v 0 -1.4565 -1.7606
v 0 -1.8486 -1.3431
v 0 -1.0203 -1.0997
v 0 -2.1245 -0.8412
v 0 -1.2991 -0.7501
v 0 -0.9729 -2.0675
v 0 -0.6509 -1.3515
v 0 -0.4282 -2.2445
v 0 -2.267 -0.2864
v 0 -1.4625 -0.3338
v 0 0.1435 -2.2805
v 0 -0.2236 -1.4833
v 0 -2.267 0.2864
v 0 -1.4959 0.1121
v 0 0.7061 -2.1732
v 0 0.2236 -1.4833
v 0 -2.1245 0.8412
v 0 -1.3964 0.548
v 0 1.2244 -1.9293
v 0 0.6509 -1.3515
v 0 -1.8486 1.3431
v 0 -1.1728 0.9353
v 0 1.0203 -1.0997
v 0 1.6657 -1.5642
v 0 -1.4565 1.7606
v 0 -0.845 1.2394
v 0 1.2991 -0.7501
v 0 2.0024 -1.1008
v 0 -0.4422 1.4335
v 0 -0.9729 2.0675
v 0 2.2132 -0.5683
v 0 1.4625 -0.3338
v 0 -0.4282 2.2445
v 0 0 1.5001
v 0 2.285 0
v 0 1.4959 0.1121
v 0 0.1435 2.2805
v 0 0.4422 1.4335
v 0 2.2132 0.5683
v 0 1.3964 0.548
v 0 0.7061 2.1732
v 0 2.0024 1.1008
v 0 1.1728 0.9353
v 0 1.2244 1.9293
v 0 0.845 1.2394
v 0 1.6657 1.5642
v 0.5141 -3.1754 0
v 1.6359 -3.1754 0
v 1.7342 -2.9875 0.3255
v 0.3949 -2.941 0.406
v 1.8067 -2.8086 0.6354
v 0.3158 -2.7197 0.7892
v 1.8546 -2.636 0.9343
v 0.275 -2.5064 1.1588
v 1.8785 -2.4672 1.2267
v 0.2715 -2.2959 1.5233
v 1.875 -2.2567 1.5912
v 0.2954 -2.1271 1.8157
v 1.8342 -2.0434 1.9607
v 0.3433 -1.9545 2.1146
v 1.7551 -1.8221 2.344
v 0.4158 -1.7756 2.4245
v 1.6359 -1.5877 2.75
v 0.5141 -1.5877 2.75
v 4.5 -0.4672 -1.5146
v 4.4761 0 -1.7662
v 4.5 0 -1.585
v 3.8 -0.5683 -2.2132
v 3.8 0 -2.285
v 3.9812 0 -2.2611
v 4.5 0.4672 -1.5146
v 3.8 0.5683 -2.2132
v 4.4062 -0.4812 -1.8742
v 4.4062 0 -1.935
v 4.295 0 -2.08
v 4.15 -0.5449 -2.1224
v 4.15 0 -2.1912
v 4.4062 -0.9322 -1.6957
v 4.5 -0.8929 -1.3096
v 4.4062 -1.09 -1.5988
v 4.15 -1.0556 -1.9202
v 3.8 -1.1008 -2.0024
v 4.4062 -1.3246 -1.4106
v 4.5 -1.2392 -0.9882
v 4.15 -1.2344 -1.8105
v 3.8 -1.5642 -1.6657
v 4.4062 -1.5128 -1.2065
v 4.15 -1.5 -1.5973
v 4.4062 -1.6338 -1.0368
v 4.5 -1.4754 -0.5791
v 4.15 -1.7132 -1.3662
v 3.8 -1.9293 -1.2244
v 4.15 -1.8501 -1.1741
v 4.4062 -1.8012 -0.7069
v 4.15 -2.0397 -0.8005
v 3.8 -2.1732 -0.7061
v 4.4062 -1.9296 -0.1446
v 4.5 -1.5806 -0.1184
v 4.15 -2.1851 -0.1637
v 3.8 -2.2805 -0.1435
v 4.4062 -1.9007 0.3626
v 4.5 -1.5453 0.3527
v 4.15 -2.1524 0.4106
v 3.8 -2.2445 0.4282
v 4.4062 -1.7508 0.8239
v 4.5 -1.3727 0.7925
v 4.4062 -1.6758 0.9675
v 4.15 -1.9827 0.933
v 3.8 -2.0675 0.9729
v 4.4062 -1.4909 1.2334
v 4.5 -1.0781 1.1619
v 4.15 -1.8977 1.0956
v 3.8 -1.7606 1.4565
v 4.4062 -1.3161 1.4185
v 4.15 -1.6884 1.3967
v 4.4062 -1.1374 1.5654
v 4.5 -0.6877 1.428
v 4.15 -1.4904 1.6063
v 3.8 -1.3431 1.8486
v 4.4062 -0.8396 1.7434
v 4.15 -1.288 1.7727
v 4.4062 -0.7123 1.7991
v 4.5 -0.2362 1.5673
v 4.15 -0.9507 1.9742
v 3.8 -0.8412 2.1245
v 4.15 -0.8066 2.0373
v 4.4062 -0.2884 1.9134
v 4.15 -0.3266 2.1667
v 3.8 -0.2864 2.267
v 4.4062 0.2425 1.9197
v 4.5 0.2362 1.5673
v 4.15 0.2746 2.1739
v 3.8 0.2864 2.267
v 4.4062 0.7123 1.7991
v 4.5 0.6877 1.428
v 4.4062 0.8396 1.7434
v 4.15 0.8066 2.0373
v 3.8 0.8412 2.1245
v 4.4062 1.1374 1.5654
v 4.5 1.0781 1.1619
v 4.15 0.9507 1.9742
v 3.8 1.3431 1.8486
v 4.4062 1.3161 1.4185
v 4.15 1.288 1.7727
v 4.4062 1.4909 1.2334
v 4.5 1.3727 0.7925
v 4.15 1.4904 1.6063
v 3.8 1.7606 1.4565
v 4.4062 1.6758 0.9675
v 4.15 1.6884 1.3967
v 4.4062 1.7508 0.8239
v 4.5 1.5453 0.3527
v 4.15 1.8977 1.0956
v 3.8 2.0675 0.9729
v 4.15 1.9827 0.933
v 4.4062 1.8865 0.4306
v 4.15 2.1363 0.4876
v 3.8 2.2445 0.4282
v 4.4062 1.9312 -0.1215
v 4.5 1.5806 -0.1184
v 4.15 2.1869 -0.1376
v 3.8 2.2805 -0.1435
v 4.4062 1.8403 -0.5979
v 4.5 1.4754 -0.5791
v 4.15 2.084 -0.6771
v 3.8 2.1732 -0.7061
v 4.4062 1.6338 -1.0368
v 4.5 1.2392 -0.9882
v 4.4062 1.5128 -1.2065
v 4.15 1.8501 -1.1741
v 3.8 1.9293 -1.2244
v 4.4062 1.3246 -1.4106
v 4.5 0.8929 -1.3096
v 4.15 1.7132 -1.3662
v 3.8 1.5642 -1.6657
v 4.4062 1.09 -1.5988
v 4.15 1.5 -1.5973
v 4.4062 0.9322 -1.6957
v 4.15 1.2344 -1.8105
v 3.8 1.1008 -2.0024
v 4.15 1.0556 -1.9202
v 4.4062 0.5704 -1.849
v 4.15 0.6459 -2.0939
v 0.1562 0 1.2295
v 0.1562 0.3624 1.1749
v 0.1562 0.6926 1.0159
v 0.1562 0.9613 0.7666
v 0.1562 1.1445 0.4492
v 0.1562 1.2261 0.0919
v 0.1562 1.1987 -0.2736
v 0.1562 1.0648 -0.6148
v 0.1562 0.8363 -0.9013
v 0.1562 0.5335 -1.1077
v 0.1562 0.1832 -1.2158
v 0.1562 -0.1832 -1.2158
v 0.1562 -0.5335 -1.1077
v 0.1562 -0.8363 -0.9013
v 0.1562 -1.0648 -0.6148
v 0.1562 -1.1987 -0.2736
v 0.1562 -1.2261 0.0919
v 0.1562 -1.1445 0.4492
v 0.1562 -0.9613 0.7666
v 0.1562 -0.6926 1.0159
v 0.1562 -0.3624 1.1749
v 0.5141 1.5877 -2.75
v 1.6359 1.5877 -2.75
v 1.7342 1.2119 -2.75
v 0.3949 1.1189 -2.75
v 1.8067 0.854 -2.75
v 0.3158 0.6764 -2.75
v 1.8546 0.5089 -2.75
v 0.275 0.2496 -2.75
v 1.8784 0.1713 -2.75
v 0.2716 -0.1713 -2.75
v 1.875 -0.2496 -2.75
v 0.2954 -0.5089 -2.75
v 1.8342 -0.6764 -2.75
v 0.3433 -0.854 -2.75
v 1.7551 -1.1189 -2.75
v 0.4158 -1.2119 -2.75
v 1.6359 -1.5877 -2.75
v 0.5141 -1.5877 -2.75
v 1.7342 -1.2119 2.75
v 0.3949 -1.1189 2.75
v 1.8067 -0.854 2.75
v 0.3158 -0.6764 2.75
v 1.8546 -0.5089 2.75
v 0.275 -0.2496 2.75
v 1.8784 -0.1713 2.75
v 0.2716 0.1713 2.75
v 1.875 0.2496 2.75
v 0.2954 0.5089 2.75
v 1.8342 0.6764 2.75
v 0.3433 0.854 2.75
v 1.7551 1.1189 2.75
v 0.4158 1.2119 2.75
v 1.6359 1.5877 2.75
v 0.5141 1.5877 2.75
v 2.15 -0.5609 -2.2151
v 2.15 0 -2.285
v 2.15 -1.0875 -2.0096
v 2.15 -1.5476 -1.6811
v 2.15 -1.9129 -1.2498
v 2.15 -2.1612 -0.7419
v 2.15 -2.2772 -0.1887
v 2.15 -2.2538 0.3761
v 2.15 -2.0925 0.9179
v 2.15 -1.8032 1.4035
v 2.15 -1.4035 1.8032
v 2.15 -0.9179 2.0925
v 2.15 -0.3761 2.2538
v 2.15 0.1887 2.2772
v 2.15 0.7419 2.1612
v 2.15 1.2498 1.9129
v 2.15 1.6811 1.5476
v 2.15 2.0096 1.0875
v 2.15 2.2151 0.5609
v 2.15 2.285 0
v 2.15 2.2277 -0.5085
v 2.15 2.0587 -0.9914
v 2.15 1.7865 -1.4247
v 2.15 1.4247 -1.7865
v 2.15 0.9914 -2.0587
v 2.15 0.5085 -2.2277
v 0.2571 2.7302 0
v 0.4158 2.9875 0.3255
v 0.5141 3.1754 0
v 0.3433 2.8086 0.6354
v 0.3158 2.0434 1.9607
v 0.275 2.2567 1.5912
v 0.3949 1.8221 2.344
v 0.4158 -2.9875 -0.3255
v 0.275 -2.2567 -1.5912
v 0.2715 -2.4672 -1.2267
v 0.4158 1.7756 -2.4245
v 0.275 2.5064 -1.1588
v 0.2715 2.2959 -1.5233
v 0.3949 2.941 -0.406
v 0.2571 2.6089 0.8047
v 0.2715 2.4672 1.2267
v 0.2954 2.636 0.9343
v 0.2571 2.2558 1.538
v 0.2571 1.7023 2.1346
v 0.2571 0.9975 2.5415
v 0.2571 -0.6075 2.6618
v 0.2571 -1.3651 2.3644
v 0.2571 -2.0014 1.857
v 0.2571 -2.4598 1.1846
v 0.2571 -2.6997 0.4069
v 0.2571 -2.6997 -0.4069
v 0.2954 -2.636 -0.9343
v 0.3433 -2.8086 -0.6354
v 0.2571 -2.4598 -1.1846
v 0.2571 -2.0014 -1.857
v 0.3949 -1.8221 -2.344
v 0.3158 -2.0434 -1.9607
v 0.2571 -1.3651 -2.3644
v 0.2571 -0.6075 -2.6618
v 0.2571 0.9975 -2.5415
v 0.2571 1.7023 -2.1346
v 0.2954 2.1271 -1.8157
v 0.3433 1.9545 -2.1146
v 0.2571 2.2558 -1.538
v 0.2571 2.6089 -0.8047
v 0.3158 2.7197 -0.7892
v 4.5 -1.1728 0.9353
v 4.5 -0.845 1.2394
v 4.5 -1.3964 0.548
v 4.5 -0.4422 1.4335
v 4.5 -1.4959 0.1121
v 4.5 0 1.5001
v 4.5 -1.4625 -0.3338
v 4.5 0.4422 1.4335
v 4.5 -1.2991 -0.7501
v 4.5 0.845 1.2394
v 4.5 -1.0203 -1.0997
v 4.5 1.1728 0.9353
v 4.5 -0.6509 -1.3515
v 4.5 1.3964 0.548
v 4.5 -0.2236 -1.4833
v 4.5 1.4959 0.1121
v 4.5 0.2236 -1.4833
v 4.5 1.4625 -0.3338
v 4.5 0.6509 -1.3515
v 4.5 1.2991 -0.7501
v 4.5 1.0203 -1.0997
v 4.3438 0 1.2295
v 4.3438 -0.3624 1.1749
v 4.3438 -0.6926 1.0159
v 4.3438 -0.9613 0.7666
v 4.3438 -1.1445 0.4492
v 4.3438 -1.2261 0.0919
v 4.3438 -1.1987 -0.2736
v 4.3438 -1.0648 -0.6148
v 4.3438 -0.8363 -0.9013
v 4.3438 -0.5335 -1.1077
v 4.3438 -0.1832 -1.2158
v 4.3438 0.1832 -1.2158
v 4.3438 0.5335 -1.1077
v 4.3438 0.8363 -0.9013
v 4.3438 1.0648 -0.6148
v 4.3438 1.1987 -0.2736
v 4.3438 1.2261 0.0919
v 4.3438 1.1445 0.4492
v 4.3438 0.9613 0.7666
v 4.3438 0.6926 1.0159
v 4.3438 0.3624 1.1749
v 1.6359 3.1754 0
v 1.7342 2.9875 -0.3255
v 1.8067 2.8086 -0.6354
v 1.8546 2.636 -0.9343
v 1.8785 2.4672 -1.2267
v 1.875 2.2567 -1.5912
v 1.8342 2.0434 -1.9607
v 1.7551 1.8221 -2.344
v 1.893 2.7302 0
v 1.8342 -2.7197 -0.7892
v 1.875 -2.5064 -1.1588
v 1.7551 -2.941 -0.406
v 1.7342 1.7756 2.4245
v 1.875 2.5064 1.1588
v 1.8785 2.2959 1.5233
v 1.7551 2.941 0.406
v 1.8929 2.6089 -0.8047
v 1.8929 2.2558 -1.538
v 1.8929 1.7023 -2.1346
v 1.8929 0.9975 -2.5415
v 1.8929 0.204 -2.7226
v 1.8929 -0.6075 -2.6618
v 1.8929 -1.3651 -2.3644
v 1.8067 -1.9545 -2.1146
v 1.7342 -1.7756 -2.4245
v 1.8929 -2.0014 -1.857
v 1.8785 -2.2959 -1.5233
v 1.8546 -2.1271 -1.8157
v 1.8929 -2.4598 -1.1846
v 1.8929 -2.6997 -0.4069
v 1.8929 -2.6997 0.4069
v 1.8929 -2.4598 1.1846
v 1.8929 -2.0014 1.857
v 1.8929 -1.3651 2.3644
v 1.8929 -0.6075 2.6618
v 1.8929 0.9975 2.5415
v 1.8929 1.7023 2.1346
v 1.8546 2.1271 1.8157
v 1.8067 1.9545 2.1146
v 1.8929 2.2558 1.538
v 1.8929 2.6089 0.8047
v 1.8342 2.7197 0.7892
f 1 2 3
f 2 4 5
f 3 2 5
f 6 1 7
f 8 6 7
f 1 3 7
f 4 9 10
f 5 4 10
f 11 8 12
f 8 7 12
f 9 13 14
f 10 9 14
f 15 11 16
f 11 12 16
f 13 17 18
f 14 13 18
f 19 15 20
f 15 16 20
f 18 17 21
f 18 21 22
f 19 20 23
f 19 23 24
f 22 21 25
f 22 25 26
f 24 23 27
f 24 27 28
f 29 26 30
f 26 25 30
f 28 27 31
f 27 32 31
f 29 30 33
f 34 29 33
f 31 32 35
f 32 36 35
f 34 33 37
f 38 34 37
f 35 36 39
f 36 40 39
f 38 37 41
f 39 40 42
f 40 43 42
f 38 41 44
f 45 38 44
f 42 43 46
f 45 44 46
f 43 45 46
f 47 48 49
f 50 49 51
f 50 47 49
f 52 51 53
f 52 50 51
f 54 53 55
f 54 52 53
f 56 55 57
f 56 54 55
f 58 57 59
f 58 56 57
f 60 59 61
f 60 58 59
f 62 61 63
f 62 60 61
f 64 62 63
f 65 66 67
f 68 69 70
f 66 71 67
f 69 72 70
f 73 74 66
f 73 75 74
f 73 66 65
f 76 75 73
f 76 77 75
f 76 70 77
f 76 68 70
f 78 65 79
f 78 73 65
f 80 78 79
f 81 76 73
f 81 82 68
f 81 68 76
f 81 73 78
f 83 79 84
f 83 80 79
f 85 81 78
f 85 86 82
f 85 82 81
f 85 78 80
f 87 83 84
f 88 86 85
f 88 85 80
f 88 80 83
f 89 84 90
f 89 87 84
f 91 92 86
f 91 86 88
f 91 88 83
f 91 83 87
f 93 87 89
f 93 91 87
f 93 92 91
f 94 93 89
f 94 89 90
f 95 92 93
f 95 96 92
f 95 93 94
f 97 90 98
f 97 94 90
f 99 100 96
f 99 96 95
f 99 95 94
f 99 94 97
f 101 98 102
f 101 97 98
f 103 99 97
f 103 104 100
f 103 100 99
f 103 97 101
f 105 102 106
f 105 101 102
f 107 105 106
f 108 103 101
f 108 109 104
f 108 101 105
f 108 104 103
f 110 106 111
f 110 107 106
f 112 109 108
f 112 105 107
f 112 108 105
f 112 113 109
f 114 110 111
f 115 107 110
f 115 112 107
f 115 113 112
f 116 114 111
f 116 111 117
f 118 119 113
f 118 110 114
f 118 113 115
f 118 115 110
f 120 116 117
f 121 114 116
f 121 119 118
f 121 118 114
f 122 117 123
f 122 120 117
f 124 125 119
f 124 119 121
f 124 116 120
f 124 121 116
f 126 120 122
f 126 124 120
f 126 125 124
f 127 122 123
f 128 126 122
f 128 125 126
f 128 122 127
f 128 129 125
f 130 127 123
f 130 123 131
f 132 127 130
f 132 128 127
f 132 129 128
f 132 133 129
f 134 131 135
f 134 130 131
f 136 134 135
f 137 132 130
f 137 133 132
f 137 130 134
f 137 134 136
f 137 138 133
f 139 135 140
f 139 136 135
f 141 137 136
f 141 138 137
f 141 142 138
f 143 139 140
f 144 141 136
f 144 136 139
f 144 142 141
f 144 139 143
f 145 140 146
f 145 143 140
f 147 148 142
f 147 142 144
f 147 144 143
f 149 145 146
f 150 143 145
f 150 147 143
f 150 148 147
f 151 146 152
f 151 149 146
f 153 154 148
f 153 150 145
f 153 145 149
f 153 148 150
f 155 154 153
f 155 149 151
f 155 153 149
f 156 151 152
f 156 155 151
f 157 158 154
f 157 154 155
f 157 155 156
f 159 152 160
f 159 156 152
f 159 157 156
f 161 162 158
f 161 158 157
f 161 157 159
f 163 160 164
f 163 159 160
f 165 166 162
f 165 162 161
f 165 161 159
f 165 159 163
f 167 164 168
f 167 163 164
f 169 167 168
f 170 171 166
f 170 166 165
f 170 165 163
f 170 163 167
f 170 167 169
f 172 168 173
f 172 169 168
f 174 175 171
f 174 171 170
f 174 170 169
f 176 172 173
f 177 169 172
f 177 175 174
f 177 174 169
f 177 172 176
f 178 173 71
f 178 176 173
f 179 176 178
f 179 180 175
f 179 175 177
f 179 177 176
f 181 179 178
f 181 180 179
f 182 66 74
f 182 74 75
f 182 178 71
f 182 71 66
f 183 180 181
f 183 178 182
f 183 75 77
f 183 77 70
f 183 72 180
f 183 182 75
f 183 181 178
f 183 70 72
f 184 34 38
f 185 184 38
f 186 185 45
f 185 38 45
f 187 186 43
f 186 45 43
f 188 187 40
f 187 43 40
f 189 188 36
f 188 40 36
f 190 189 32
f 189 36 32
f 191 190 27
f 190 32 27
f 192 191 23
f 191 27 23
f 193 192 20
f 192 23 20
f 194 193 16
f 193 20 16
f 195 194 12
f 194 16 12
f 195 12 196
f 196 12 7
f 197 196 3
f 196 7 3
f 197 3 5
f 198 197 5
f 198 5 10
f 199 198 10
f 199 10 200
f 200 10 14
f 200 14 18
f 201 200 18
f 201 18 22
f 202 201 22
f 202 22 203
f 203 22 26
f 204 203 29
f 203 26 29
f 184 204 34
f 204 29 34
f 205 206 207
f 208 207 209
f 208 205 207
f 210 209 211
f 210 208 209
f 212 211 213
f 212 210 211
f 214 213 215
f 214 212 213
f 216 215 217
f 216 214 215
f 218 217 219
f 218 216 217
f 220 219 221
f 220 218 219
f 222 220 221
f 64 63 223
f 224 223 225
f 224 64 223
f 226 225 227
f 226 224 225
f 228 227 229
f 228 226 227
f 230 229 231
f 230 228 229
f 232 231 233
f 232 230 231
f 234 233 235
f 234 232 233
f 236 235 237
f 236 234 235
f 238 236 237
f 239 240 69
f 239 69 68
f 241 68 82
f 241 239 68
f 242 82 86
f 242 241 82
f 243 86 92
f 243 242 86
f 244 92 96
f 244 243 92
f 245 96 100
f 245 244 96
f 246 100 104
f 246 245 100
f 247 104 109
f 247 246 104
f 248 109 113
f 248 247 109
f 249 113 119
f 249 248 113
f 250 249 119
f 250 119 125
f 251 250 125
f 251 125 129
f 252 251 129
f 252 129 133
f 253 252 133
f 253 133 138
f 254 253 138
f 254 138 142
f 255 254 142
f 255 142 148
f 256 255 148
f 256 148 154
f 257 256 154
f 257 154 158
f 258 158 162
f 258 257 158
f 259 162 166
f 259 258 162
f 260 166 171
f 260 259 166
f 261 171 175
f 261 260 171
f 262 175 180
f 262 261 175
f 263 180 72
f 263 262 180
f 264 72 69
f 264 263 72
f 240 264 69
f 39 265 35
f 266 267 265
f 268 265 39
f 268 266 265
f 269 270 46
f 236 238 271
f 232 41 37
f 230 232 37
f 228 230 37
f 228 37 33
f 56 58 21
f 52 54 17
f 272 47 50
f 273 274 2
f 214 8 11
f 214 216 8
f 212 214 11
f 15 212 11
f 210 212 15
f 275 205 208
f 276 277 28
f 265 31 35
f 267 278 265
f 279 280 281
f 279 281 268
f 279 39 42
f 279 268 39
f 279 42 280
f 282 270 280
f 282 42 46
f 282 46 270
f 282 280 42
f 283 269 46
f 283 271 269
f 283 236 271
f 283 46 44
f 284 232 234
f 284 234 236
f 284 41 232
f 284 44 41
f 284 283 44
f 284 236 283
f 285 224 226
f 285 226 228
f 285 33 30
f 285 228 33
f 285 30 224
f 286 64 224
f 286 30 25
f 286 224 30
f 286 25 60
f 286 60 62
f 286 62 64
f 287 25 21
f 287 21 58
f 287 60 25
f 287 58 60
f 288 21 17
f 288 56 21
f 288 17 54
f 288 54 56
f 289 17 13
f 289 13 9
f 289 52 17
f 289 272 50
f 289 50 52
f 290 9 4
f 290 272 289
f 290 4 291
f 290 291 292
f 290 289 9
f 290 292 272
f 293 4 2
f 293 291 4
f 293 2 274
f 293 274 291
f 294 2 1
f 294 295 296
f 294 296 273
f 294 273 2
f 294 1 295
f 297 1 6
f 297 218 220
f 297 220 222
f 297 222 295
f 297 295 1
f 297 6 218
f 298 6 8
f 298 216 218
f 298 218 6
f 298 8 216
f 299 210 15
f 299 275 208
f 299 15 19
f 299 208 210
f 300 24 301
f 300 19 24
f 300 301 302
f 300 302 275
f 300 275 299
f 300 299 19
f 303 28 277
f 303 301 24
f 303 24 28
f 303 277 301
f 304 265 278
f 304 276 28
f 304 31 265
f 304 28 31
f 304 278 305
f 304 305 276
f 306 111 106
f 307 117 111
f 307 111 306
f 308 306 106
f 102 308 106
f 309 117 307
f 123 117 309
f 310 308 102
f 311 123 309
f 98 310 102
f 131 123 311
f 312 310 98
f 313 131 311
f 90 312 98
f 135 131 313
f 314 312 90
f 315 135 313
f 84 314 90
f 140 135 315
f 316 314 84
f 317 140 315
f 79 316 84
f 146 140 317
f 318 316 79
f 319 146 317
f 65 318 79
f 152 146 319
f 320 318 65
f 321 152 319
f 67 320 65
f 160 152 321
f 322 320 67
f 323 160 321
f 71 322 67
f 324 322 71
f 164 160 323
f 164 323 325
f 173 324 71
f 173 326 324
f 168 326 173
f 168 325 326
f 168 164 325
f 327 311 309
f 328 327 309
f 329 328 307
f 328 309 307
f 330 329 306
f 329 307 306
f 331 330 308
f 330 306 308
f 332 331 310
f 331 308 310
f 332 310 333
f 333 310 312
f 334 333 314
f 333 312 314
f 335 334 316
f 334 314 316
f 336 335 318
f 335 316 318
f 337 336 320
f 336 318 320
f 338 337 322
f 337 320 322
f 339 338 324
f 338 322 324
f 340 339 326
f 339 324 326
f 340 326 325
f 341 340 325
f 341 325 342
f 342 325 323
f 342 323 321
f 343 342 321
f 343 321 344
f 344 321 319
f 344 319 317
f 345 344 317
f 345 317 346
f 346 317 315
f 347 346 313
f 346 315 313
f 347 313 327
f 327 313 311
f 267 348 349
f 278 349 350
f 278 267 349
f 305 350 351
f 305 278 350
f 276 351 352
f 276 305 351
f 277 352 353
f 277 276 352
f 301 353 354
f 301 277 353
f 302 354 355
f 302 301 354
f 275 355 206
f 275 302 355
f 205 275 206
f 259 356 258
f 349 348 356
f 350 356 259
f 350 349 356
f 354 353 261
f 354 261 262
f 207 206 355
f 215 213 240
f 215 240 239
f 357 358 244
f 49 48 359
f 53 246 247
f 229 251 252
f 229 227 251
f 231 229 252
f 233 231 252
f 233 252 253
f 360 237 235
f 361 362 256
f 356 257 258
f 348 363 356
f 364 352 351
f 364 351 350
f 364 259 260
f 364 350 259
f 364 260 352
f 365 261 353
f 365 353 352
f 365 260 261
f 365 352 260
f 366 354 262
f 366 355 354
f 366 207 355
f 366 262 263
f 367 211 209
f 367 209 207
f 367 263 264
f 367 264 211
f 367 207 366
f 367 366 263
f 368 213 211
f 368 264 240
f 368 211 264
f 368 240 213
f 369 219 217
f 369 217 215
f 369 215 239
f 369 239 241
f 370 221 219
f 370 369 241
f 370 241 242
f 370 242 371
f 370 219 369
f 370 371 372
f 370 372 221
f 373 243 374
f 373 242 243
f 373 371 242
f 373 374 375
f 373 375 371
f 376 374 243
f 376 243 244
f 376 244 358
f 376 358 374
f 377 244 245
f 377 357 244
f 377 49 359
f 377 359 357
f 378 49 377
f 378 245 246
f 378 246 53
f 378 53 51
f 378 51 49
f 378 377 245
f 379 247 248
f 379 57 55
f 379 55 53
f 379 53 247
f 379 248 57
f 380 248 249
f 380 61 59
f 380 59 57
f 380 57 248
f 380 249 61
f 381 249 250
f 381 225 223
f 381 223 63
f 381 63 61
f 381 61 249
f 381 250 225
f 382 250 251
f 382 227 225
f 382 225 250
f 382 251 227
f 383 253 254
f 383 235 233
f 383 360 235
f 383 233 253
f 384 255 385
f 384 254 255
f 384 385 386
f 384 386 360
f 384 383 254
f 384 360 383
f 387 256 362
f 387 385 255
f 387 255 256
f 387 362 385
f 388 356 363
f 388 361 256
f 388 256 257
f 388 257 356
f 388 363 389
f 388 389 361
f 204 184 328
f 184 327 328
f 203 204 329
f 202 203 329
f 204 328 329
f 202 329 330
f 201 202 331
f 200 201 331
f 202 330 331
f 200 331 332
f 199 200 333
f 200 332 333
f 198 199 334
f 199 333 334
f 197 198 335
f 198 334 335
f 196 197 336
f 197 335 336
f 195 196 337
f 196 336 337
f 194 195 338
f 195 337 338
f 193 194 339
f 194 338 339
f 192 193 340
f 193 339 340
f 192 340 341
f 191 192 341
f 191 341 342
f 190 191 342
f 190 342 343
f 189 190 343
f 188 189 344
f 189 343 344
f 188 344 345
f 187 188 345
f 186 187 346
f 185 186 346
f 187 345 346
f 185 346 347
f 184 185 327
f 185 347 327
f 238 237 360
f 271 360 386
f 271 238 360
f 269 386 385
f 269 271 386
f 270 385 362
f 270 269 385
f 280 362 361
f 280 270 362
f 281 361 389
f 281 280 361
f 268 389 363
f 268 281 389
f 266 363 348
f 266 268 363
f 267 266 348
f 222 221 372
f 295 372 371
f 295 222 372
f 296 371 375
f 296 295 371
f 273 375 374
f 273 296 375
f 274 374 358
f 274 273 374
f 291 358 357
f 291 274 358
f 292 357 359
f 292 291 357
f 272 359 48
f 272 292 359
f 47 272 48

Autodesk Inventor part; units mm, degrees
ref_plane "YZ Plane" through (0, 0, 0) normal (1, 0, 0) x (0, 1, 0)
ref_plane "XZ Plane" through (0, 0, 0) normal (0, 1, 0) x (-1, 0, 0)
sketch "Sketch1" plane through (0, 0, 0) normal (1, 0, 0) x (0, 1, 0)
  line L0 (1.5877, -2.75) -> (-1.5877, -2.75)
  line L1 (-1.5877, -2.75) -> (-3.1754, 0)
  line L2 (-3.1754, 0) -> (-1.5877, 2.75)
  line L3 (-1.5877, 2.75) -> (1.5877, 2.75)
  line L4 (1.5877, 2.75) -> (3.1754, 0)
  line L5 (3.1754, 0) -> (1.5877, -2.75)
  point P0 (0, 0)
  point P1 (0, 0)
  dimension "d0" = 6.3509
extrude "Body" add sketch "Sketch1" along normal blind 2.15
sketch "Sketch2" plane through (2.15, 0, 0) normal (1, 0, 0) x (0, 0, -1)
  circle A0 centre (0, 0) radius 2.285
  dimension "d7" = 4.57
extrude "Ring" add sketch "Sketch2" along normal blind 2.35
sketch "Sketch3" plane through (0, 0, 0) normal (0, 0, 1) x (1, 0, 0)
  line L0 (0, 1.5877) -> (0, 3.1754) projected
  line L1 (0, 3.1754) -> (2.15, 3.1754) projected
  line L2 (2.15, 1.5877) -> (2.15, 3.1754) projected
  line L3 (-0.43, 0) -> (2.58, 0) projected
  line L4 (0, 2.285) -> (0.5141, 3.1754)
  line L5 (1.6359, 3.1754) -> (2.15, 2.285)
  dimension "d3" = 30
  dimension "d4" = 30
  dimension "d5" = 4.57
  dimension "d6" = 4.57
revolve "Chamfer1" cut sketch "Sketch3" angle 360 about axis through (-10, 0, 0) along (1, 0, 0)
sketch "Sketch4" plane through (0, 0, 0) normal (-1, 0, 0) x (0, 0, 1)
  line L0 (0, -4.4456) -> (0, 4.4456) projected
  line L1 (-3.85, 0) -> (3.85, 0) projected
  point P0 (0, 0)
hole "Thread" at (0, 0, 0) direction (1, 0, 0) diameter 2.459 end through all thread size "M3x0.5" designation "M3" class "6H" standard "ISO Metric profile"
chamfer "Chamfer2" distance 0.2706 angle 30 1 edges at (0, 0, -1.2295) measured on face at (0, 1.908, -0.2317)
chamfer "Chamfer3" distance 0.2706 angle 30 1 edges at (4.5, 0, -1.2295) measured on face at (4.5, -0.2804, -1.8991)
ref_plane "Work Plane1" through (9.5307, 0, 0) normal (0, 0, 1) x (-1, 0, 0)
fillet "Fillet1" radius 0.7 1 edges at (4.5, 0, 2.285)
equation "\"d0\" = 1.1547 * SW"
equation "\"d1\" = KOH1"
equation "\"d7\" = SD2"
equation "\"d8\" = KOH - KOH1"
equation "\"d3\" = ANG1"
equation "\"d4\" = ANG2"
equation "\"d5\" = SW0"
equation "\"d6\" = SW01"
equation "\"d10\" = -0.5 * GD1 + 0.5 * NND"
equation "\"d46\" = -0.5 * GD1 + 0.5 * NND"
equation "\"d12\" = -0.5 * GD1 + 0.5 * NND"
equation "\"d47\" = -0.5 * GD1 + 0.5 * NND"
equation "\"ANG1\" = 30deg"
equation "\"ANG2\" = 30deg"
equation "\"NND\" = 3"
equation "\"KOH1\" = 2.15"
equation "\"KOH\" = 4.5"
equation "\"SW\" = 5.5"
equation "\"SW0\" = 4.57"
equation "\"SW01\" = SW0"
equation "\"SD2\" = SW0"
equation "\"GUL\" = 0.541266 * PTC"
equation "\"THREADDIA\" = 3"
equation "\"TOA\" = 30deg"
equation "\"PTC\" = 0.5"
equation "\"E0\" = 1.155 * SW"
equation "\"GAL\" = 0.541266 * PTC"
equation "\"GD1\" = 2.458734"
properties part number "ISO 7040 - M3" material "Steel"
